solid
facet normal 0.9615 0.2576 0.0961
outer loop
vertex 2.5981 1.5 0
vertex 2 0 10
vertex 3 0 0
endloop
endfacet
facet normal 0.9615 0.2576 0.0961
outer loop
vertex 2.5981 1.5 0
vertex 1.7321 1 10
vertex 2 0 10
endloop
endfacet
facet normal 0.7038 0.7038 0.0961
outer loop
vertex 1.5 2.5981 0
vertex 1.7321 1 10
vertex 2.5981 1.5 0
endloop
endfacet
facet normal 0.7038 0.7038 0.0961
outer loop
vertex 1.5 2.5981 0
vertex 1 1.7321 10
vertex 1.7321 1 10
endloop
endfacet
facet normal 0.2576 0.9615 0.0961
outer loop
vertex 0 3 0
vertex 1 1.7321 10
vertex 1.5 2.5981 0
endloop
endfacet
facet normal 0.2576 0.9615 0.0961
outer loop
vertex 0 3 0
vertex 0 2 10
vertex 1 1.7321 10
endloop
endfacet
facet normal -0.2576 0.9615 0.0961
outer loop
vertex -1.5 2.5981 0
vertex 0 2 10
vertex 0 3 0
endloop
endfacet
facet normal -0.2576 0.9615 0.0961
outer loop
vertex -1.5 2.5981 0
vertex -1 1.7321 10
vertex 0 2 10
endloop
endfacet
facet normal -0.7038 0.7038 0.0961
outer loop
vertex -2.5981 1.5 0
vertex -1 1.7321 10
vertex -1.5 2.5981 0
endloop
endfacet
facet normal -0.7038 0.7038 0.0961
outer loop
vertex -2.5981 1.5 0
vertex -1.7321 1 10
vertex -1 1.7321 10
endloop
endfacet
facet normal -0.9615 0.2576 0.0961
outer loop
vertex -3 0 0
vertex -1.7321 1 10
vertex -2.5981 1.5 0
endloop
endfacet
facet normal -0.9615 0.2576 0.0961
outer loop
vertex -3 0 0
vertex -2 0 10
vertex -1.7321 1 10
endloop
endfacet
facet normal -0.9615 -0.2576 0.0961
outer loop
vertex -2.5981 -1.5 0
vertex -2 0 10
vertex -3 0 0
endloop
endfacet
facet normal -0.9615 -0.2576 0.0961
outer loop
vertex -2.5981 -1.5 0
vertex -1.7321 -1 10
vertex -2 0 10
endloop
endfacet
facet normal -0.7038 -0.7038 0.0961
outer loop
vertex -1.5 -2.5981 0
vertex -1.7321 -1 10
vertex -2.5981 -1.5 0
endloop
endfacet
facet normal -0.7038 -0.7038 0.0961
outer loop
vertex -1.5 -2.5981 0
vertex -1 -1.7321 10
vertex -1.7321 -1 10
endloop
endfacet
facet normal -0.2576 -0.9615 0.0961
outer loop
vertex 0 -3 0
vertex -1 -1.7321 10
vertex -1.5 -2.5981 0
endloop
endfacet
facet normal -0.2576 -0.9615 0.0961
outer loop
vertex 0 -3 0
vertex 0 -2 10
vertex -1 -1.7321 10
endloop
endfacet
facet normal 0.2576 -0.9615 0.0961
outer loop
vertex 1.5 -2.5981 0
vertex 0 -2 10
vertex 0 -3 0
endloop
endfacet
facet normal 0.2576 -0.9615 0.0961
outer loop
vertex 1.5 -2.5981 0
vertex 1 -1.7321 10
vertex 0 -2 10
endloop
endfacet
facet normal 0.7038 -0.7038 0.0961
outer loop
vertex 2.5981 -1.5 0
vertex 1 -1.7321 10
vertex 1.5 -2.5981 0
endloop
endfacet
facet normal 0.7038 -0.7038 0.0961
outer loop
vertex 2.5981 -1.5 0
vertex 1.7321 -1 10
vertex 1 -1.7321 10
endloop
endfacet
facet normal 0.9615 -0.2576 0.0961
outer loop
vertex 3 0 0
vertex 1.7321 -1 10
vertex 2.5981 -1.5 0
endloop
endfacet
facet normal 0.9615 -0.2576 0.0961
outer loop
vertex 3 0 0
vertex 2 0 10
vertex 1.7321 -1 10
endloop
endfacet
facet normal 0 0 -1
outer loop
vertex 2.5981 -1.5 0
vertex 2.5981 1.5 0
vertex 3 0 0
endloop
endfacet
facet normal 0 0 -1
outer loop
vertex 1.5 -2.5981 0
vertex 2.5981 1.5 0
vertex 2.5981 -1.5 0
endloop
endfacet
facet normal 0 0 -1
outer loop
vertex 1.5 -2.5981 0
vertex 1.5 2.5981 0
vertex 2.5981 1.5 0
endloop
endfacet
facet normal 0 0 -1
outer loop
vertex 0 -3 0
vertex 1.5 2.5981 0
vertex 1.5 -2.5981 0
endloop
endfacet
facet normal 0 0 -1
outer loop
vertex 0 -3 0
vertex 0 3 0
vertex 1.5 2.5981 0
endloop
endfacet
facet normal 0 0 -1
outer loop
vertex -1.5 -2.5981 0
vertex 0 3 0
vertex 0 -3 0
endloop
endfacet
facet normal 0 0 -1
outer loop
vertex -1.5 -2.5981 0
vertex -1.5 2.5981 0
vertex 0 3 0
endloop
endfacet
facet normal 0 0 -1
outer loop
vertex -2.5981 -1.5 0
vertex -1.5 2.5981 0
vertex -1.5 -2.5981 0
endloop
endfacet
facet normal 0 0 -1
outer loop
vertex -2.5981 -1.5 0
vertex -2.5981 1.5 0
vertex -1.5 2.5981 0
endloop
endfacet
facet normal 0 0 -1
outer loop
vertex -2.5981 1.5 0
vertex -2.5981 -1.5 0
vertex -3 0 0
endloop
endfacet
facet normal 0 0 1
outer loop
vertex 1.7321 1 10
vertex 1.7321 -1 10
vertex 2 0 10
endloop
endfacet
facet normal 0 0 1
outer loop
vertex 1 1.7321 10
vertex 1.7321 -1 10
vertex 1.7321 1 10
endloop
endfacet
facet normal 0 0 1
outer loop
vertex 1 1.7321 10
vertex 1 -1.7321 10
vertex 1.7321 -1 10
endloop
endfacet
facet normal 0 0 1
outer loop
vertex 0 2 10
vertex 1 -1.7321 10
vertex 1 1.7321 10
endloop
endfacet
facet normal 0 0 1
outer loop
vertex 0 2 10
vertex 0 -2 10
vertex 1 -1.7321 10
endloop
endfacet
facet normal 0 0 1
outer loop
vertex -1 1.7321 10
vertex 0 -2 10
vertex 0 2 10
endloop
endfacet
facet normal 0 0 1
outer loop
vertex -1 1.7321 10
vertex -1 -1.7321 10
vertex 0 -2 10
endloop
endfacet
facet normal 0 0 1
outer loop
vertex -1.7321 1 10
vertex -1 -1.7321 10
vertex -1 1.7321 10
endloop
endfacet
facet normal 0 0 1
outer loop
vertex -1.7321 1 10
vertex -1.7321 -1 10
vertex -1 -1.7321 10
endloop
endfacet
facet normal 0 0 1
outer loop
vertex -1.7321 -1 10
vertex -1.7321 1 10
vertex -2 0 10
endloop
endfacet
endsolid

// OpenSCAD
// Unit of length: Unit.MM
cylinder(h = 10.0, d1 = 6.0, d2 = 4.0, center = false, $fn = 12);
